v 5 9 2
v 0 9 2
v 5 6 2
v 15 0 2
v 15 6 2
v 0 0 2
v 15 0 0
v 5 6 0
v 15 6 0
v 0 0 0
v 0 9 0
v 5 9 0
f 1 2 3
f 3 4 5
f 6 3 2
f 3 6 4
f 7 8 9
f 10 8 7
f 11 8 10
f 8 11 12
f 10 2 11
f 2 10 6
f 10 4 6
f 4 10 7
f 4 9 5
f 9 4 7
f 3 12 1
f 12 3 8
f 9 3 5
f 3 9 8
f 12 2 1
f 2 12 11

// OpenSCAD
translate([2.5, 1.5, 1.0]) color([0.6021704873486543, 0.07399689426047196, 0.12444372203200982]) cube([5, 3, 2], center=true);
translate([7.5, 1.5, 1.0]) color([0.18852062230064282, 0.830086131214745, 0.11969547265179015]) cube([5, 3, 2], center=true);
translate([12.5, 1.5, 1.0]) color([0.09153185315534418, 0.8338444305994857, 0.11604613837891842]) cube([5, 3, 2], center=true);
translate([2.5, 4.5, 1.0]) color([0.6055041702213623, 0.19459095568233187, 0.9706919132543499]) cube([5, 3, 2], center=true);
translate([7.5, 4.5, 1.0]) color([0.7181133264593419, 0.47923365392220396, 0.7271552294548347]) cube([5, 3, 2], center=true);
translate([12.5, 4.5, 1.0]) color([0.06108489585644861, 0.6793471949009788, 0.5442354114772292]) cube([5, 3, 2], center=true);
translate([2.5, 7.5, 1.0]) color([0.620599970977755, 0.8359026555711022, 0.07000430092833387]) cube([5, 3, 2], center=true);
